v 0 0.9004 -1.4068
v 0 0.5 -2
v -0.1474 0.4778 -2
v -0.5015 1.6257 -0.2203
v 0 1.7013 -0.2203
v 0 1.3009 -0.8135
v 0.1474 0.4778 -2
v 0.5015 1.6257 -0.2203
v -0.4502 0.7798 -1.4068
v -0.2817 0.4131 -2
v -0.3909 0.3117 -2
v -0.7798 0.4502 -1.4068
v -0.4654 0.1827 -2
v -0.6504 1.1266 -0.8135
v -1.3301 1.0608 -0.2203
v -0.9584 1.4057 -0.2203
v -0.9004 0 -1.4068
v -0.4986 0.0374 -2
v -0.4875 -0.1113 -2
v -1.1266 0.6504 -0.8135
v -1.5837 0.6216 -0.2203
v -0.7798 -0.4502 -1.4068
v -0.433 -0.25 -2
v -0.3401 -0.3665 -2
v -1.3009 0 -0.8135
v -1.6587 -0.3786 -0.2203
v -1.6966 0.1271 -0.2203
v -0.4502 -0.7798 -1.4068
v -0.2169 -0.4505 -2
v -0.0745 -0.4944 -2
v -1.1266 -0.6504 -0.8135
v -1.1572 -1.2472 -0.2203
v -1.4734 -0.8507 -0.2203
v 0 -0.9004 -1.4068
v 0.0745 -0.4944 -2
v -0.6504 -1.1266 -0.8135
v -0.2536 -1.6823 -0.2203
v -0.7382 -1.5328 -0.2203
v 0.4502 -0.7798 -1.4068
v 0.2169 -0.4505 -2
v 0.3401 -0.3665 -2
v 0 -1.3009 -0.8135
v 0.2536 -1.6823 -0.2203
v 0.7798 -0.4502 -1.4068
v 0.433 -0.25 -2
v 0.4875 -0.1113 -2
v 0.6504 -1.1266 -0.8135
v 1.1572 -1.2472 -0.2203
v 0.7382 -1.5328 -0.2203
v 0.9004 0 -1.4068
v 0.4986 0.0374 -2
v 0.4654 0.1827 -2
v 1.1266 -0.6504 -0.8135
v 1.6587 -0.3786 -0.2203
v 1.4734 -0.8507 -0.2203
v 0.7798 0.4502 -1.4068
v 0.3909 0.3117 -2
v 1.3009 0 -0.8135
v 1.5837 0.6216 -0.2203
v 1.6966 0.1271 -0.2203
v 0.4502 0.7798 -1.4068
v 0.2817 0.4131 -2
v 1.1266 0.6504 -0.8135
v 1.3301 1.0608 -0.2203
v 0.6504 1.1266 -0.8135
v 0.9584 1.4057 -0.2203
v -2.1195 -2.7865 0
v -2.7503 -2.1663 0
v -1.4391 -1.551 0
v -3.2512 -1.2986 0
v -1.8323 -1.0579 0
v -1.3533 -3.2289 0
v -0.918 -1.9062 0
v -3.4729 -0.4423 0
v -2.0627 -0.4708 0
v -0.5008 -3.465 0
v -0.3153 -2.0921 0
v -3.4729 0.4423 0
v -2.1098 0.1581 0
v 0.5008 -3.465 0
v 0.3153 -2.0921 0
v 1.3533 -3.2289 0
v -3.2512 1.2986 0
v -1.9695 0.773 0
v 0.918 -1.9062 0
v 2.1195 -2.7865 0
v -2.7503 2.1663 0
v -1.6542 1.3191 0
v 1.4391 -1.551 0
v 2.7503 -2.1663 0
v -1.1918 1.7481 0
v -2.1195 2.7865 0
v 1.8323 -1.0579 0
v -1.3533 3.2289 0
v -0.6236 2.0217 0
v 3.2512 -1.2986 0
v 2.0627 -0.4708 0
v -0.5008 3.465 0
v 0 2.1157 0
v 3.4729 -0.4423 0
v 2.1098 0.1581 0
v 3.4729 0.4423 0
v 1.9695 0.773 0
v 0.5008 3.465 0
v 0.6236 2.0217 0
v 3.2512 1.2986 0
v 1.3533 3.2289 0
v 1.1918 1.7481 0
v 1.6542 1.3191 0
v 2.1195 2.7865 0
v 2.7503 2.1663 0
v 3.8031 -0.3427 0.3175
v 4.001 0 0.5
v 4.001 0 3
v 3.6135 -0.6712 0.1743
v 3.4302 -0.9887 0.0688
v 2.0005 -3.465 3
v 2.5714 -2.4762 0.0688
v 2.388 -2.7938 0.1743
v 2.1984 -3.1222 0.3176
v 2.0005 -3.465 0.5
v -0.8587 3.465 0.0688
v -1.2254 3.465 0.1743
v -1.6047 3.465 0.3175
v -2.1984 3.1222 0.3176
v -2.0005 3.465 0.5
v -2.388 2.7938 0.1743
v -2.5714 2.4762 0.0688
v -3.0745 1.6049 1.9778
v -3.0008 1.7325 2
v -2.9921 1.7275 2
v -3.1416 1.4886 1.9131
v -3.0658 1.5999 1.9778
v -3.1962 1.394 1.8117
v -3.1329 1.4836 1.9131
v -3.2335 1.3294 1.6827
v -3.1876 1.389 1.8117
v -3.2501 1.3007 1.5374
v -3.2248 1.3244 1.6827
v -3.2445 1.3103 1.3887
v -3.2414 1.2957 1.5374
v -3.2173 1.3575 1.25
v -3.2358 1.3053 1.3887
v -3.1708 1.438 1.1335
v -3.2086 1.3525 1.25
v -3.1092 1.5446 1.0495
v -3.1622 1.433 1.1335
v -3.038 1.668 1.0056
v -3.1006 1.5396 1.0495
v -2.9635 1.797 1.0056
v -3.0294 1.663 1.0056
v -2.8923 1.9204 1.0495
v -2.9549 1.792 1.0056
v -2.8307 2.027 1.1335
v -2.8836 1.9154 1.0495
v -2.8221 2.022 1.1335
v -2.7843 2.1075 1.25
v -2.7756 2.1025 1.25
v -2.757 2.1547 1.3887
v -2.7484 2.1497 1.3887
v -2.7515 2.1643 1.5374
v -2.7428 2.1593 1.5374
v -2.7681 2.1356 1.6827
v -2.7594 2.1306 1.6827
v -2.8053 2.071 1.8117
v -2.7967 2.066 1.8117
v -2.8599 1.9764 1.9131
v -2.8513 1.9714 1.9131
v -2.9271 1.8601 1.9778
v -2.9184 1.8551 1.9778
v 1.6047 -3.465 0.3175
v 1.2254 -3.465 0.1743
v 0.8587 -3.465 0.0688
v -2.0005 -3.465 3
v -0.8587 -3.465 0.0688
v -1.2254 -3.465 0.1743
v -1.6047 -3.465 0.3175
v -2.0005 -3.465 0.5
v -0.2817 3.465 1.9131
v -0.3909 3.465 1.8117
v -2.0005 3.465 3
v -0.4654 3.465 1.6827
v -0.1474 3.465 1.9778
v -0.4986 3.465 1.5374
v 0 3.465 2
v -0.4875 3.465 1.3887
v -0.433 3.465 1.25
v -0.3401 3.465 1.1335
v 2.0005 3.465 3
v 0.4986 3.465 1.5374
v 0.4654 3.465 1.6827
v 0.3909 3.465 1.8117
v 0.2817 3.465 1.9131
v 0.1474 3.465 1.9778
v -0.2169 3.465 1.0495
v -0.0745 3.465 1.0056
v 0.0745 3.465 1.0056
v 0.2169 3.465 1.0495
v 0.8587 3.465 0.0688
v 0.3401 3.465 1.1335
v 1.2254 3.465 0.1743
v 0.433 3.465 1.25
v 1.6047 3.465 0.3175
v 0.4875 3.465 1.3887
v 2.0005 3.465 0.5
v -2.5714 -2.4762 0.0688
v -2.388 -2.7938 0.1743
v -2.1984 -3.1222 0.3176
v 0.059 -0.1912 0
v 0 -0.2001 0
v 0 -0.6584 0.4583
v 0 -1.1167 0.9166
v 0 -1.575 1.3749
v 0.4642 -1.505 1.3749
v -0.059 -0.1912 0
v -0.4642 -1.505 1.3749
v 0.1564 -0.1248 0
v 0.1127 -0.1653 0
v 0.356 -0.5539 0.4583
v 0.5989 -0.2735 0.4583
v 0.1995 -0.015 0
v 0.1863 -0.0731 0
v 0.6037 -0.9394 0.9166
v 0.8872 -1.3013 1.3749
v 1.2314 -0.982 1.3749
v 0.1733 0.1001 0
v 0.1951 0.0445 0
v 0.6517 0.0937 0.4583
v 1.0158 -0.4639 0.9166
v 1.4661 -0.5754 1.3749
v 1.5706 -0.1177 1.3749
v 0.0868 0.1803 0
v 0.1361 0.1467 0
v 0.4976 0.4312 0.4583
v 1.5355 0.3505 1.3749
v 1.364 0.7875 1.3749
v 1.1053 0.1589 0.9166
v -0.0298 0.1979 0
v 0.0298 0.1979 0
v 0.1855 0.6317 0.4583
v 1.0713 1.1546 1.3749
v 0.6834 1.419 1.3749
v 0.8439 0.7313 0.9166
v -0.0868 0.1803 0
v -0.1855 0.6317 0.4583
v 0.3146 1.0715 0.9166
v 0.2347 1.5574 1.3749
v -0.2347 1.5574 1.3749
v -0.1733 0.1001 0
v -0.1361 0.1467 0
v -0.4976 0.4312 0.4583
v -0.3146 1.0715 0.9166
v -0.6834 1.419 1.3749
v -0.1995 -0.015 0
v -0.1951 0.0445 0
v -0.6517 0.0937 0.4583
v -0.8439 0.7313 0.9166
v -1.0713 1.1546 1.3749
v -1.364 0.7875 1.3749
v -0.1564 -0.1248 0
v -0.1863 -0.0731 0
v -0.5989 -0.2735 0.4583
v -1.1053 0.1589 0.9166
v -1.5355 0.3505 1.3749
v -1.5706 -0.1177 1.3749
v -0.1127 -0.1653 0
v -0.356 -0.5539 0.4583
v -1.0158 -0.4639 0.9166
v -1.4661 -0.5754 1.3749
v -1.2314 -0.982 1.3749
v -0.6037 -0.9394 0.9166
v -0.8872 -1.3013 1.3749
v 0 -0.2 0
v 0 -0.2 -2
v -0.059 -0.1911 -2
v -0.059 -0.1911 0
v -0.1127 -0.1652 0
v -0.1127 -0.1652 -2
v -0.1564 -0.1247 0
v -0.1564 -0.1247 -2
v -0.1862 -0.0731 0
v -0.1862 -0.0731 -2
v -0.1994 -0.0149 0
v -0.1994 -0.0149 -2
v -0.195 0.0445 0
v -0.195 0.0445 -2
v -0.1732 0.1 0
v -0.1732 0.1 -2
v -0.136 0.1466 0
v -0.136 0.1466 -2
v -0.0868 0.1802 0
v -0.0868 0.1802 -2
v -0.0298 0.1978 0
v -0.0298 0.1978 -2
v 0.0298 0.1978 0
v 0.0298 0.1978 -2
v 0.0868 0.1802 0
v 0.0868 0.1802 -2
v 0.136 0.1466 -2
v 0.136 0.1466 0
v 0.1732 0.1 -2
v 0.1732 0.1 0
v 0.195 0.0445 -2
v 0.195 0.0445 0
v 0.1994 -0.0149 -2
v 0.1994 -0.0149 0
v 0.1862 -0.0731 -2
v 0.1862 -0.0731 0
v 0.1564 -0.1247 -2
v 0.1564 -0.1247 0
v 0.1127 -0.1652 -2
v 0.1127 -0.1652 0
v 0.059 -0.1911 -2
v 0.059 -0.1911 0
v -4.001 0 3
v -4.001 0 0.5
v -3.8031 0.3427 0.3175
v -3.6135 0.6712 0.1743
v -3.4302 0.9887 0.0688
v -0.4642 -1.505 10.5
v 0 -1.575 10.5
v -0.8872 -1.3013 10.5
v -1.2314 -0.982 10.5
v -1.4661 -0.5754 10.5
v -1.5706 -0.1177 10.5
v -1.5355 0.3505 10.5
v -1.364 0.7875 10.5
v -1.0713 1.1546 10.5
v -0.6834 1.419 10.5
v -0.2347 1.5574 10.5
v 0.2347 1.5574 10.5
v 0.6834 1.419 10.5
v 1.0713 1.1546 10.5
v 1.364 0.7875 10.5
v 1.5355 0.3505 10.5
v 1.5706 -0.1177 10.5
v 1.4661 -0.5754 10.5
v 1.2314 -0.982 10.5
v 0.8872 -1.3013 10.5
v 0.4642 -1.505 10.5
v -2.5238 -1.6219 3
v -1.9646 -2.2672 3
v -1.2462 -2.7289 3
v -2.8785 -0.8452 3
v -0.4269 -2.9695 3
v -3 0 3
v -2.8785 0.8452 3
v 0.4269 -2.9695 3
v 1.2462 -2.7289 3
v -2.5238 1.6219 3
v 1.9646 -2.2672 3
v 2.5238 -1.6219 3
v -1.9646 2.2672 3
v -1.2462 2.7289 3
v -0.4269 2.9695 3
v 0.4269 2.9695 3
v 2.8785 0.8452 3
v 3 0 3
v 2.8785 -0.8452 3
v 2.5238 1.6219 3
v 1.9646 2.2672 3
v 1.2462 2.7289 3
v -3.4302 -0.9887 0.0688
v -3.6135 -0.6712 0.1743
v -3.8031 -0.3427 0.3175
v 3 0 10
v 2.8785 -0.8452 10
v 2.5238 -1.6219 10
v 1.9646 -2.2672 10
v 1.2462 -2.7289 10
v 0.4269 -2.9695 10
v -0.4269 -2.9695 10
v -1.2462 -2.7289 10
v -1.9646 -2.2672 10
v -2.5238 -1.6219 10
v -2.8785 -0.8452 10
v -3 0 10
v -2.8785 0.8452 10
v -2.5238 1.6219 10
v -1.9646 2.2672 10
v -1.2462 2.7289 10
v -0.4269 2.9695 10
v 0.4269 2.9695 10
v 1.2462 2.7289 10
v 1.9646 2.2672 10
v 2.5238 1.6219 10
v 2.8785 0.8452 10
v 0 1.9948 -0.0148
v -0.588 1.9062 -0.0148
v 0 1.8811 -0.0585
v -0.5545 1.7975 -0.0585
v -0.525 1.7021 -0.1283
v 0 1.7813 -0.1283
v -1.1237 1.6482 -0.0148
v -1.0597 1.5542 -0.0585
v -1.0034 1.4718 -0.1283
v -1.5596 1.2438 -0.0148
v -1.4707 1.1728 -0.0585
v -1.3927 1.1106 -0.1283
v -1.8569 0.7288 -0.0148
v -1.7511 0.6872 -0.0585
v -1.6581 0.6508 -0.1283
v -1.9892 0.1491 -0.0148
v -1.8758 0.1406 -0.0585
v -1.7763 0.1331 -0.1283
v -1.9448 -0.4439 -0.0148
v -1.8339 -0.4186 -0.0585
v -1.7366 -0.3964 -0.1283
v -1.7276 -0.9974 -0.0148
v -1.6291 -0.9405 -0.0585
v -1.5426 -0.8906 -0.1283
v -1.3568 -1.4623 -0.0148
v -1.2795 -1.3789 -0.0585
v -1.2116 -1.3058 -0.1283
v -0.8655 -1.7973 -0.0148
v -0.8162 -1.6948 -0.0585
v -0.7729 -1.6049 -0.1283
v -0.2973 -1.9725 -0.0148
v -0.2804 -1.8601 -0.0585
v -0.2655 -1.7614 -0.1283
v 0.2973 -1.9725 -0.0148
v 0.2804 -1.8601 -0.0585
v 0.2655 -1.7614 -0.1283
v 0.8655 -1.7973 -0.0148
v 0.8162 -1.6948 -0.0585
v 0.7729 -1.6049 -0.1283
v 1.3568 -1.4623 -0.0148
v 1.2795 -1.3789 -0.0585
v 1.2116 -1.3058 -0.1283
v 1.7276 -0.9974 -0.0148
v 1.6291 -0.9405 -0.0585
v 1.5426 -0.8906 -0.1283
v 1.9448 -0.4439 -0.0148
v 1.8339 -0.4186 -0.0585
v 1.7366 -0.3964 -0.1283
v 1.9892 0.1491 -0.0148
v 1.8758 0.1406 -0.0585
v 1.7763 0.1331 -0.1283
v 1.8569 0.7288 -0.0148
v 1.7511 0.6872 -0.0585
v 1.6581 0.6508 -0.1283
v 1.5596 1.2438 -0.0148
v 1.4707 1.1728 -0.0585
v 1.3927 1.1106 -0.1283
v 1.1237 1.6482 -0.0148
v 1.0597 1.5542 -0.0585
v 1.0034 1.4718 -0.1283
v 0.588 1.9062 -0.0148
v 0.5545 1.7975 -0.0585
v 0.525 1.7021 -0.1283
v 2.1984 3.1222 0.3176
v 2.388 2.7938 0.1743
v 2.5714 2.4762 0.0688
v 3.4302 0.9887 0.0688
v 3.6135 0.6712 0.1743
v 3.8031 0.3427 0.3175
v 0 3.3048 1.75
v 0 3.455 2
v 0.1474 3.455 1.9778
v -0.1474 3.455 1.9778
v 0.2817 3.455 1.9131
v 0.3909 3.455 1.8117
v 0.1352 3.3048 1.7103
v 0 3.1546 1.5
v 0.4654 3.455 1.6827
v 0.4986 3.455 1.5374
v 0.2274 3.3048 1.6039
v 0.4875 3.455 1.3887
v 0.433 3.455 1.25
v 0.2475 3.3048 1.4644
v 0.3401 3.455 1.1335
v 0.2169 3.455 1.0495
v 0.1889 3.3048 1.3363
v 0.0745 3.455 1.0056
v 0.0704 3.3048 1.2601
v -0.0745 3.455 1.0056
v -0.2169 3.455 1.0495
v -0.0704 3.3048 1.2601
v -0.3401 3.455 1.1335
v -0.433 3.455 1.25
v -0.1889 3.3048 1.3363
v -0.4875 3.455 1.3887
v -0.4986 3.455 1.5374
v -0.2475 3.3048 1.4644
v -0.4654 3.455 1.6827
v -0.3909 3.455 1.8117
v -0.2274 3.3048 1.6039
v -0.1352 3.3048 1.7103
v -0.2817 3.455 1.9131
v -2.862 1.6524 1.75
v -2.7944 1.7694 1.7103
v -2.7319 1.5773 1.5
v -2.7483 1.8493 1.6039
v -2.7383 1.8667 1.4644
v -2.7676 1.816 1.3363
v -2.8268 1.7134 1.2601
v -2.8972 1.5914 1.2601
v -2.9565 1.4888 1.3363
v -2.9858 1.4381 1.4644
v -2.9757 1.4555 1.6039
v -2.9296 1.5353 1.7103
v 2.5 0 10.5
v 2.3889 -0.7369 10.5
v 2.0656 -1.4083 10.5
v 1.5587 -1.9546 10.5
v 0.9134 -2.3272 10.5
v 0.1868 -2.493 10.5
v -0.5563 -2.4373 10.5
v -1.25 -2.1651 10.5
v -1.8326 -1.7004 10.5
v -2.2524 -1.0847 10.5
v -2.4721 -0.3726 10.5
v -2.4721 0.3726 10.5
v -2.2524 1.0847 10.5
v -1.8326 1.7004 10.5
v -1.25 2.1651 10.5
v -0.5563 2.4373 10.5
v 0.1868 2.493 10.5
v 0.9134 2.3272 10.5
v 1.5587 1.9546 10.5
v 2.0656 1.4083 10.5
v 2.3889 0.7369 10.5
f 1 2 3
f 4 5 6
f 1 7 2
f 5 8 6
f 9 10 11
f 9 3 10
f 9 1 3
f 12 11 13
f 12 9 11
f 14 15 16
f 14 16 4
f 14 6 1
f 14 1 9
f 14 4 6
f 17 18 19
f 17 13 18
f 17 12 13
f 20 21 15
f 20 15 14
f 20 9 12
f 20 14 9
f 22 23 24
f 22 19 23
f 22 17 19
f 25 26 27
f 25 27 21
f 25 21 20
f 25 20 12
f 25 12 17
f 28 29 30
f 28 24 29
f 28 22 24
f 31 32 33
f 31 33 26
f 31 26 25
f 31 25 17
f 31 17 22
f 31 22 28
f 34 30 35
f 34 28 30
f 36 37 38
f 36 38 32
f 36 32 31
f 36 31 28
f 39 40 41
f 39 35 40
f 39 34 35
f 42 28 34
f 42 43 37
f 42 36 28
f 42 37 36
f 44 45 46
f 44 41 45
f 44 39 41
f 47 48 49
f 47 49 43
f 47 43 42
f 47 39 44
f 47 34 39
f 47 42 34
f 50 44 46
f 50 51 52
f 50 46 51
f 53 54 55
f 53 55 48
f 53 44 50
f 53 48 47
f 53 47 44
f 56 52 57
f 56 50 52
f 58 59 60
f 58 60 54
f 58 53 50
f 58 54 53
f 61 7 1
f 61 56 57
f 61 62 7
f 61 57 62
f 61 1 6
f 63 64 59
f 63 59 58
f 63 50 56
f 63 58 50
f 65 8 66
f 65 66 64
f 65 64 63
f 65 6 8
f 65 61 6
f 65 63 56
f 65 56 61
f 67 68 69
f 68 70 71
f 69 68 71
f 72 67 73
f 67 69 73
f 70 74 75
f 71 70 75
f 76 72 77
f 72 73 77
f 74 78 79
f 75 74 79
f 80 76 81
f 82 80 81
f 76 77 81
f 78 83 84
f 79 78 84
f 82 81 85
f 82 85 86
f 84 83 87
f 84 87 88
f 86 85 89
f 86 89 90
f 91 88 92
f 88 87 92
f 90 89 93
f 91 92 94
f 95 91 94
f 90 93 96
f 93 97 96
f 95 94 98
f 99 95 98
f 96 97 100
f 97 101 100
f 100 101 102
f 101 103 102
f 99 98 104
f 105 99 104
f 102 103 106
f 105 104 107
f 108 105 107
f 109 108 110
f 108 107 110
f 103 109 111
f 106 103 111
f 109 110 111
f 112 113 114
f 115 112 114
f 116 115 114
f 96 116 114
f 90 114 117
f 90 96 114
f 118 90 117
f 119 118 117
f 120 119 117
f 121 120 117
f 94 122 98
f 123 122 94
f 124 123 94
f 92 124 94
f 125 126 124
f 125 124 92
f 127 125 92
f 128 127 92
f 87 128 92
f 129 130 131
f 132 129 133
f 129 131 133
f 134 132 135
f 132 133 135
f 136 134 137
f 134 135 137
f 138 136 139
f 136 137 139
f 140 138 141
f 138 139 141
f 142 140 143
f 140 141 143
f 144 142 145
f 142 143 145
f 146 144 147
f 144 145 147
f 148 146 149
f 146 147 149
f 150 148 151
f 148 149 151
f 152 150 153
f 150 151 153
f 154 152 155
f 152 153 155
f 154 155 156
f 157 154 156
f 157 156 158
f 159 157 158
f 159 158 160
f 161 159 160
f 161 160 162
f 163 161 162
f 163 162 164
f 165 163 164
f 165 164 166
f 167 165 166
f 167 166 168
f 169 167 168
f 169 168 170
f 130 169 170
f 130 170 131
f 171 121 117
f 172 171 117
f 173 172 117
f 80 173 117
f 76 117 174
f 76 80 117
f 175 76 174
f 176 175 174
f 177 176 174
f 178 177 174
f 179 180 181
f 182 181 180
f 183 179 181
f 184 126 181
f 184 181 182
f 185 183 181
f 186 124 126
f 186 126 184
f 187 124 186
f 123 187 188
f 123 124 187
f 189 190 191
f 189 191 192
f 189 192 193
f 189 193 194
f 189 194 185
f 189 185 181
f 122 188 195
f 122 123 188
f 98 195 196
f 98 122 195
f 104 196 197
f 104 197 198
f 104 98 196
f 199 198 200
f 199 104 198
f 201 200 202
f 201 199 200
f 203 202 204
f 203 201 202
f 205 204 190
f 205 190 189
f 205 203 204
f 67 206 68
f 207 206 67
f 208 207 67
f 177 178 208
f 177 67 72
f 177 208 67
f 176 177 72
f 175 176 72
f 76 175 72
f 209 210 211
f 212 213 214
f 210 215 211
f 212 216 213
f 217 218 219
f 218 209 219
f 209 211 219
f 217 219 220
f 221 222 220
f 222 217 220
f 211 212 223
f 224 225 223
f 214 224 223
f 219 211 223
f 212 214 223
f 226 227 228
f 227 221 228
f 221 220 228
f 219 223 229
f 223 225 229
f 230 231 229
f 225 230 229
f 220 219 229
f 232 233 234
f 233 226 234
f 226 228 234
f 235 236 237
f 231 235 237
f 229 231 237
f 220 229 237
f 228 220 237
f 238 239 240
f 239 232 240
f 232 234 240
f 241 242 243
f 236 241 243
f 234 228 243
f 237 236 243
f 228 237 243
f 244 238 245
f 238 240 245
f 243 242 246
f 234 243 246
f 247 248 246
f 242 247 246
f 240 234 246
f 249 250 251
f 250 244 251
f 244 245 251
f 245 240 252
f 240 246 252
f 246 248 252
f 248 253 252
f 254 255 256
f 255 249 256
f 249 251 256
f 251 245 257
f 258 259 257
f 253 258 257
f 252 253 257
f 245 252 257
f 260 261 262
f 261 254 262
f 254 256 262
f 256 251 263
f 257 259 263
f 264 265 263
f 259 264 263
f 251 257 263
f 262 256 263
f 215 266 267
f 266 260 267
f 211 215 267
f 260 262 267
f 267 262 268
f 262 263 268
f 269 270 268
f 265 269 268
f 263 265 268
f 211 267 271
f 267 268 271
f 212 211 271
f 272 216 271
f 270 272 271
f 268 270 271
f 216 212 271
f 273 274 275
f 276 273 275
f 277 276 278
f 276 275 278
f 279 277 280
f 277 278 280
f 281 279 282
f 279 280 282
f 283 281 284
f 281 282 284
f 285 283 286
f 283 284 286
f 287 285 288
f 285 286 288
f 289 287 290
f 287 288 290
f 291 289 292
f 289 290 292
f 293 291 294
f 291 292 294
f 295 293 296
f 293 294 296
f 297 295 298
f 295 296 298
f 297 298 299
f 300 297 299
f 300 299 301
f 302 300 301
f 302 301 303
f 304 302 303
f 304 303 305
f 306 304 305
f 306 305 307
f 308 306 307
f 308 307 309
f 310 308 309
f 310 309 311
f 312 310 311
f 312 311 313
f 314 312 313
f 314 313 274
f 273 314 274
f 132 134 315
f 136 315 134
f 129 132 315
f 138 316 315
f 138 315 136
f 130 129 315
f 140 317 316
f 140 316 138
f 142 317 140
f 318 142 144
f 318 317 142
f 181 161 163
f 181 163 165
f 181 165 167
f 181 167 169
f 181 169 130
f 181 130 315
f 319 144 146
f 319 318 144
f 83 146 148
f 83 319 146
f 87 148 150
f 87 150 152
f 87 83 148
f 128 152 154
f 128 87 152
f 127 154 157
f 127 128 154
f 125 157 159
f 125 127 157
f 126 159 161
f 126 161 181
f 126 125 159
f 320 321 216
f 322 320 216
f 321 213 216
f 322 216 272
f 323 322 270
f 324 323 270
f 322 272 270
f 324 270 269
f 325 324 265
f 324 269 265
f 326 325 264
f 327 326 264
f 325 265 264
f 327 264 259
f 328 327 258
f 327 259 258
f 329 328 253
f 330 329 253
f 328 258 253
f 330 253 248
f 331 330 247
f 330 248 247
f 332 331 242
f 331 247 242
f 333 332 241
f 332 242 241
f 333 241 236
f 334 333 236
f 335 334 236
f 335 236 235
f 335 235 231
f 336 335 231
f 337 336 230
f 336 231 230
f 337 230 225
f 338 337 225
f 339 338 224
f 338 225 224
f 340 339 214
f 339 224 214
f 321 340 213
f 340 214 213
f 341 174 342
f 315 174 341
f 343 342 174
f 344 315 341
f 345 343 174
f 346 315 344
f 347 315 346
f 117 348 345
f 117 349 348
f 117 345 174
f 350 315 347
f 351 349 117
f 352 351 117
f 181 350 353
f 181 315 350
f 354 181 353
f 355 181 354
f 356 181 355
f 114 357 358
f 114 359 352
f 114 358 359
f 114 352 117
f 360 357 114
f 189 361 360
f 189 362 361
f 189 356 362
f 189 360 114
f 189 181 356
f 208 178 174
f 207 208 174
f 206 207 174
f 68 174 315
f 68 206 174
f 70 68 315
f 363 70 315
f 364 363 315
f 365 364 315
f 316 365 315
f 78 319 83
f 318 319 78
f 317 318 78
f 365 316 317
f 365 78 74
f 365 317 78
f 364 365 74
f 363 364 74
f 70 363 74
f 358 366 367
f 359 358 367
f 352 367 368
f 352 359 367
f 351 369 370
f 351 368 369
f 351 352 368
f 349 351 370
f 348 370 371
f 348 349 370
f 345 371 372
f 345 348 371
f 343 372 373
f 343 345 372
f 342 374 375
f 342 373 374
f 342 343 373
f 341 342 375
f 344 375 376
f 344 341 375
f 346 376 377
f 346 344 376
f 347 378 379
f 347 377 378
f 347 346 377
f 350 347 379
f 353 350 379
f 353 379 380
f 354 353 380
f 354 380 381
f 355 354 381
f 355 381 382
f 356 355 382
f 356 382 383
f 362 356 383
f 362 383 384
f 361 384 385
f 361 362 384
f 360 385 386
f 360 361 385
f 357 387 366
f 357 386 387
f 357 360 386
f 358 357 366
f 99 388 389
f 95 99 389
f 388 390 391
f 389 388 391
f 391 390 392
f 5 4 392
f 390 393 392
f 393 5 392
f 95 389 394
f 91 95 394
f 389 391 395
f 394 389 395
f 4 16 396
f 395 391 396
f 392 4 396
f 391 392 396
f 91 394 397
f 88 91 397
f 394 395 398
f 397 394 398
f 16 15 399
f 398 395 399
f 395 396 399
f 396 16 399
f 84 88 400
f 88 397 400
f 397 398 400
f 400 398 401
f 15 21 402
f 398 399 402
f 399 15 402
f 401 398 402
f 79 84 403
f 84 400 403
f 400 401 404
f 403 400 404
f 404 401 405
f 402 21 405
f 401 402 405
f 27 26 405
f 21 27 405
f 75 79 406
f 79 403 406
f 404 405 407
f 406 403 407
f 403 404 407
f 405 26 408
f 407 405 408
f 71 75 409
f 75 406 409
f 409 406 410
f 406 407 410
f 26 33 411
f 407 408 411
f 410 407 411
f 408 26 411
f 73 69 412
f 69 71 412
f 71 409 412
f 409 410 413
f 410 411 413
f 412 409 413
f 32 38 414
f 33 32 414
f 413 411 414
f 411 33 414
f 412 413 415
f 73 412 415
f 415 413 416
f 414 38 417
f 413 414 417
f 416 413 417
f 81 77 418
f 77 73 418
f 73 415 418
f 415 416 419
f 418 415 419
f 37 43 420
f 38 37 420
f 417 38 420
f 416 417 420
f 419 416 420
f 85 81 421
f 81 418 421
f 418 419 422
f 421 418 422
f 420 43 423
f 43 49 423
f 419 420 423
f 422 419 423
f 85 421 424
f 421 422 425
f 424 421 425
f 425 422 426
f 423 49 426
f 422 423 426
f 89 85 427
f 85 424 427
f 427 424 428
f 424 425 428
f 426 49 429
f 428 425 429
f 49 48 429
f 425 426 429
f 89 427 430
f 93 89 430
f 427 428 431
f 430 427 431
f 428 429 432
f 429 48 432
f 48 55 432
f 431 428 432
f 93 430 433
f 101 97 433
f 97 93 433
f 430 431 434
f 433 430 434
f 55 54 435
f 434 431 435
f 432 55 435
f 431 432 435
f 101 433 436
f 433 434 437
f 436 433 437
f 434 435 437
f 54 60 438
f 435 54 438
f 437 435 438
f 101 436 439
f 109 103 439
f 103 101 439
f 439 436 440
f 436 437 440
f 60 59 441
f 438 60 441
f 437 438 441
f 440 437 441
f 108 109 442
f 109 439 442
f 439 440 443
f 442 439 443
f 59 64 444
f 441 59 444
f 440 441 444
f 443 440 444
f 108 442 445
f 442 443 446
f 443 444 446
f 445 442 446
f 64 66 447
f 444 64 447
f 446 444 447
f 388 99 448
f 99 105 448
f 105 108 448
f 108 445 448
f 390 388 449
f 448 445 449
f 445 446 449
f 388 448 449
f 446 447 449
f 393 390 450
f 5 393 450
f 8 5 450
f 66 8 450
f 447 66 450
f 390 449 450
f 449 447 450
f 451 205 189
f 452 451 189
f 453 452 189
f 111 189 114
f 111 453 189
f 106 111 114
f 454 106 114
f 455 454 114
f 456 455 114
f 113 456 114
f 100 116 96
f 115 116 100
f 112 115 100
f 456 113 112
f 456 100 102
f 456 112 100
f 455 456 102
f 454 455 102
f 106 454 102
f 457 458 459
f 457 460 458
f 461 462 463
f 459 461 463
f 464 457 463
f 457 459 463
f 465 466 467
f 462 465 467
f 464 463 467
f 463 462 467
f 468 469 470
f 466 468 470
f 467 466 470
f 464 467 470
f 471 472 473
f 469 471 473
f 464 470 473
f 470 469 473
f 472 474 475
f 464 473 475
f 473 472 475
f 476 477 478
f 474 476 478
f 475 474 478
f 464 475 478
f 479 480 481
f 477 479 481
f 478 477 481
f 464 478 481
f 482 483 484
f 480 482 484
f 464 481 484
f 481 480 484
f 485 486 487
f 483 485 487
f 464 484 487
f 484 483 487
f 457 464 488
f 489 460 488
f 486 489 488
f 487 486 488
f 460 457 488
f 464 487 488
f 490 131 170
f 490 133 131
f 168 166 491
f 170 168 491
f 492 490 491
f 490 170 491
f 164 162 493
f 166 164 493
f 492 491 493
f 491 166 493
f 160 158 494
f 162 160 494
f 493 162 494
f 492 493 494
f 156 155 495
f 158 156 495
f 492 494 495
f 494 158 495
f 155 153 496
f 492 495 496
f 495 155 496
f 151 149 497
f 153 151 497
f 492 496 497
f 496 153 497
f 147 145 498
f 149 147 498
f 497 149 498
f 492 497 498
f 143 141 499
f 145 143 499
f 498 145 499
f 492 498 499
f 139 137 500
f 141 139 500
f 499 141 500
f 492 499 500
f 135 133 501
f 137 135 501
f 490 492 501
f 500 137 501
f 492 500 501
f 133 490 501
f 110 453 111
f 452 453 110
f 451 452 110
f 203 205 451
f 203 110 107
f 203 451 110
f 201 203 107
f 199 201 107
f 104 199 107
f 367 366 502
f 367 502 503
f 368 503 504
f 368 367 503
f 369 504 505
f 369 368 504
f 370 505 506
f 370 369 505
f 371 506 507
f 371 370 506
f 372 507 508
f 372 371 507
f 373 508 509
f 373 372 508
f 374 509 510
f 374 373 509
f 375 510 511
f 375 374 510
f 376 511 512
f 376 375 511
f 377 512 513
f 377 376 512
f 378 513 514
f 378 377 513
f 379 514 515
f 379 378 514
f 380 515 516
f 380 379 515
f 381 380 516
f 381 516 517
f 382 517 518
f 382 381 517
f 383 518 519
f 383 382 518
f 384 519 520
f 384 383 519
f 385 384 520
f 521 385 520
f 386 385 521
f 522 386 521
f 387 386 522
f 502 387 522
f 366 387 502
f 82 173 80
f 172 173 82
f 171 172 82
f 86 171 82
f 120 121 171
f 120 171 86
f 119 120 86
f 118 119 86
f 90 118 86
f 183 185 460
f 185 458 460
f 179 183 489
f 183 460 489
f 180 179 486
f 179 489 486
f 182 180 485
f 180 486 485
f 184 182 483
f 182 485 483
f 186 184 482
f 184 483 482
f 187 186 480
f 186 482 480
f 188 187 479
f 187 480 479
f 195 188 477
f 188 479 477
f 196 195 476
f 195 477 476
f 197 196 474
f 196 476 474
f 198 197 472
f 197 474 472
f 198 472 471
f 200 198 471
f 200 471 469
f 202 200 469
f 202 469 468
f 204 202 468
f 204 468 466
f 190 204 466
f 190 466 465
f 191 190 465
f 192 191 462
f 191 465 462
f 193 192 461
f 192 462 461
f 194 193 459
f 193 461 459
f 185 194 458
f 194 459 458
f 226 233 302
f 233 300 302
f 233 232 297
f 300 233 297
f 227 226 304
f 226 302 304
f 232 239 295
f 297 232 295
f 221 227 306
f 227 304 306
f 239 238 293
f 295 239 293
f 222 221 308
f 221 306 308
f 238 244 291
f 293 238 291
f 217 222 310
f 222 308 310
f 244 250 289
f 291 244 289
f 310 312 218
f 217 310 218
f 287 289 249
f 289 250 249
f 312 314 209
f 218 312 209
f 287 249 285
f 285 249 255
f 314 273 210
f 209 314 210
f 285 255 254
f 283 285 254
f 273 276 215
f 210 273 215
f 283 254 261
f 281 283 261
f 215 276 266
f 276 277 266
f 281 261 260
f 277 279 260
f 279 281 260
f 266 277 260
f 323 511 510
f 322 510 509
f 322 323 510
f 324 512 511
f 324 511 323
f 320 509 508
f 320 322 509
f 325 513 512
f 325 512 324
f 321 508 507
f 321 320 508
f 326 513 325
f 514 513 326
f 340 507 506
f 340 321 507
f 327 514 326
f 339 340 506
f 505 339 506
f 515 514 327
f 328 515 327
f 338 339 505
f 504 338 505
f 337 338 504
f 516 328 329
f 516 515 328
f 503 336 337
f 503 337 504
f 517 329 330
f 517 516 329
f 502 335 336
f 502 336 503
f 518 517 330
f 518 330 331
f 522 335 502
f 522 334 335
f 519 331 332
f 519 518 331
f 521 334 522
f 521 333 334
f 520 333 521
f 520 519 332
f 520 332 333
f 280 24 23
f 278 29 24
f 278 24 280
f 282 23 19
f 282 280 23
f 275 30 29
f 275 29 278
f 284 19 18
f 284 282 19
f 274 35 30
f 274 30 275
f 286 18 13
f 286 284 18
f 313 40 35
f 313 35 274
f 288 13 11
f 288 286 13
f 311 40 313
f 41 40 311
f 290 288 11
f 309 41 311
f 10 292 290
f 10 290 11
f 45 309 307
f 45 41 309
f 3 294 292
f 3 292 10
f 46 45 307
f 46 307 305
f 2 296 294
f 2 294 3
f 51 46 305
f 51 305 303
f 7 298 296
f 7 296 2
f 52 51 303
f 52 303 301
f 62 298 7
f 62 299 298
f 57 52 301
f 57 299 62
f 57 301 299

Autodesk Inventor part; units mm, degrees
ref_plane "YZ Plane" through (0, 0, 0) normal (1, 0, 0) x (0, 1, 0)
ref_plane "XZ Plane" through (0, 0, 0) normal (0, 1, 0) x (-1, 0, 0)
ref_plane "XY Plane" through (0, 0, 0) normal (0, 0, 1) x (1, 0, 0)
sketch "Esquisse1" plane through (0, 0, 0) normal (0, 0, 1) x (1, 0, 0)
  line L0 (2.0005, 3.465) -> (4.001, 0)
  line L1 (4.001, 0) -> (2.0005, -3.465)
  line L2 (2.0005, -3.465) -> (-2.0005, -3.465)
  line L3 (-2.0005, -3.465) -> (-4.001, 0)
  line L4 (-4.001, 0) -> (-2.0005, 3.465)
  line L5 (-2.0005, 3.465) -> (2.0005, 3.465)
  point P0 (0, 0)
  point P1 (0, 0)
  dimension "d0" = 6.93
extrude "Extrusion1" add sketch "Esquisse1" along normal blind 3
sketch "Esquisse2" plane through (0, 0, 3) normal (0, 0, 1) x (1, 0, 0)
  circle A0 centre (0, 0) radius 3
  dimension "d3" = 6
extrude "Extrusion2" add sketch "Esquisse2" along normal blind 7.5
sketch "Esquisse3" plane through (0, 0, 0) normal (1, 0, 0) x (0, 1, 0)
  line L0 (1.85, 0) -> (0.5, -2)
  line L1 (0.5, -2) -> (0, -2)
  line L2 (0, -2) -> (0, 0)
  line L3 (0, 0) -> (1.85, 0)
  line L4 (0, 0) -> (3.465, 0) construction
  line L5 (0, 0) -> (0, -9.9285)
  dimension "d6" = 2
  dimension "d7" = 1
  dimension "d8" = 3.7
revolve "Révolution1" add sketch "Esquisse3" angle 360 about axis through (0, 0, 0) along (0, 0, -1)
chamfer "Chanfrein1" distance 0.5 angle 45 1 edges at (-3, 0, 10.5)
thread "Filetage1" size "M6x1" class "6g" standard "ANSI Metric M Profile" full length
sketch "Esquisse4" plane through (0, 0, 0) normal (0, 1, 0) x (-1, 0, 0)
  line L0 (2.0005, 0) -> (4.001, 0) projected
  line L1 (3.501, 0) -> (4.001, 0.5)
  line L2 (4.001, 0.5) -> (4.001, 0)
  line L3 (4.001, 0) -> (3.501, 0)
  line L4 (0, 0) -> (0, 3.501)
  dimension "d15" = 0.5
  dimension "d16" = 0.5
revolve "Révolution2" cut sketch "Esquisse4" angle 360 about axis through (0, 0, 0) along (0, 0, 1)
fillet "Congé1" radius 0.5 1 edges at (0, -1.85, 0)
sketch "Esquisse5" plane through (0, 0, 10.5) normal (0, 0, 1) x (1, 0, 0)
  point P0 (0, 0)
  point P1 (0, 0)
hole "Perçage1" at (0, 0, 10.5) direction (0, 0, -1) diameter 0.4 end through all counterbore diameter 3.15 counterbore depth 10.5
sketch "Esquisse6" plane through (-2.0005, 3.465, 3) normal (0, 1, 0) x (1, 0, 0)
  line L0 (1.4995, 3) -> (2.5016, 3) construction
  line L1 (4.7508, 3) -> (2.5016, 3) construction
  line L2 (6.0016, 0) -> (4.001, 0) construction
  point P0 (2.0005, 3)
  point P1 (2.0005, 1.5)
  point P2 (4.001, 1.5)
  point P3 (2.0005, 3)
  dimension "d26" = 3
  dimension "d27" = 1.5
hole "Perçage2" at (0, 3.465, 1.5) direction (0, -1, 0) diameter 1 depth 0.01 tip angle 118
pattern_circular "Réseau circulaire1" count 2 over 60 about axis through (0, 0, -5.8801) along (0, 0, 1) of "Perçage2"
chamfer "Chanfrein2" distance 1.375 angle 45 1 edges at (0, 1.575, 0)
equation "\"d16\" = d15"
equation "\"d27\" = 0.5 * d26"
properties part number "Buse 04" material "Laiton, jaune doux"
